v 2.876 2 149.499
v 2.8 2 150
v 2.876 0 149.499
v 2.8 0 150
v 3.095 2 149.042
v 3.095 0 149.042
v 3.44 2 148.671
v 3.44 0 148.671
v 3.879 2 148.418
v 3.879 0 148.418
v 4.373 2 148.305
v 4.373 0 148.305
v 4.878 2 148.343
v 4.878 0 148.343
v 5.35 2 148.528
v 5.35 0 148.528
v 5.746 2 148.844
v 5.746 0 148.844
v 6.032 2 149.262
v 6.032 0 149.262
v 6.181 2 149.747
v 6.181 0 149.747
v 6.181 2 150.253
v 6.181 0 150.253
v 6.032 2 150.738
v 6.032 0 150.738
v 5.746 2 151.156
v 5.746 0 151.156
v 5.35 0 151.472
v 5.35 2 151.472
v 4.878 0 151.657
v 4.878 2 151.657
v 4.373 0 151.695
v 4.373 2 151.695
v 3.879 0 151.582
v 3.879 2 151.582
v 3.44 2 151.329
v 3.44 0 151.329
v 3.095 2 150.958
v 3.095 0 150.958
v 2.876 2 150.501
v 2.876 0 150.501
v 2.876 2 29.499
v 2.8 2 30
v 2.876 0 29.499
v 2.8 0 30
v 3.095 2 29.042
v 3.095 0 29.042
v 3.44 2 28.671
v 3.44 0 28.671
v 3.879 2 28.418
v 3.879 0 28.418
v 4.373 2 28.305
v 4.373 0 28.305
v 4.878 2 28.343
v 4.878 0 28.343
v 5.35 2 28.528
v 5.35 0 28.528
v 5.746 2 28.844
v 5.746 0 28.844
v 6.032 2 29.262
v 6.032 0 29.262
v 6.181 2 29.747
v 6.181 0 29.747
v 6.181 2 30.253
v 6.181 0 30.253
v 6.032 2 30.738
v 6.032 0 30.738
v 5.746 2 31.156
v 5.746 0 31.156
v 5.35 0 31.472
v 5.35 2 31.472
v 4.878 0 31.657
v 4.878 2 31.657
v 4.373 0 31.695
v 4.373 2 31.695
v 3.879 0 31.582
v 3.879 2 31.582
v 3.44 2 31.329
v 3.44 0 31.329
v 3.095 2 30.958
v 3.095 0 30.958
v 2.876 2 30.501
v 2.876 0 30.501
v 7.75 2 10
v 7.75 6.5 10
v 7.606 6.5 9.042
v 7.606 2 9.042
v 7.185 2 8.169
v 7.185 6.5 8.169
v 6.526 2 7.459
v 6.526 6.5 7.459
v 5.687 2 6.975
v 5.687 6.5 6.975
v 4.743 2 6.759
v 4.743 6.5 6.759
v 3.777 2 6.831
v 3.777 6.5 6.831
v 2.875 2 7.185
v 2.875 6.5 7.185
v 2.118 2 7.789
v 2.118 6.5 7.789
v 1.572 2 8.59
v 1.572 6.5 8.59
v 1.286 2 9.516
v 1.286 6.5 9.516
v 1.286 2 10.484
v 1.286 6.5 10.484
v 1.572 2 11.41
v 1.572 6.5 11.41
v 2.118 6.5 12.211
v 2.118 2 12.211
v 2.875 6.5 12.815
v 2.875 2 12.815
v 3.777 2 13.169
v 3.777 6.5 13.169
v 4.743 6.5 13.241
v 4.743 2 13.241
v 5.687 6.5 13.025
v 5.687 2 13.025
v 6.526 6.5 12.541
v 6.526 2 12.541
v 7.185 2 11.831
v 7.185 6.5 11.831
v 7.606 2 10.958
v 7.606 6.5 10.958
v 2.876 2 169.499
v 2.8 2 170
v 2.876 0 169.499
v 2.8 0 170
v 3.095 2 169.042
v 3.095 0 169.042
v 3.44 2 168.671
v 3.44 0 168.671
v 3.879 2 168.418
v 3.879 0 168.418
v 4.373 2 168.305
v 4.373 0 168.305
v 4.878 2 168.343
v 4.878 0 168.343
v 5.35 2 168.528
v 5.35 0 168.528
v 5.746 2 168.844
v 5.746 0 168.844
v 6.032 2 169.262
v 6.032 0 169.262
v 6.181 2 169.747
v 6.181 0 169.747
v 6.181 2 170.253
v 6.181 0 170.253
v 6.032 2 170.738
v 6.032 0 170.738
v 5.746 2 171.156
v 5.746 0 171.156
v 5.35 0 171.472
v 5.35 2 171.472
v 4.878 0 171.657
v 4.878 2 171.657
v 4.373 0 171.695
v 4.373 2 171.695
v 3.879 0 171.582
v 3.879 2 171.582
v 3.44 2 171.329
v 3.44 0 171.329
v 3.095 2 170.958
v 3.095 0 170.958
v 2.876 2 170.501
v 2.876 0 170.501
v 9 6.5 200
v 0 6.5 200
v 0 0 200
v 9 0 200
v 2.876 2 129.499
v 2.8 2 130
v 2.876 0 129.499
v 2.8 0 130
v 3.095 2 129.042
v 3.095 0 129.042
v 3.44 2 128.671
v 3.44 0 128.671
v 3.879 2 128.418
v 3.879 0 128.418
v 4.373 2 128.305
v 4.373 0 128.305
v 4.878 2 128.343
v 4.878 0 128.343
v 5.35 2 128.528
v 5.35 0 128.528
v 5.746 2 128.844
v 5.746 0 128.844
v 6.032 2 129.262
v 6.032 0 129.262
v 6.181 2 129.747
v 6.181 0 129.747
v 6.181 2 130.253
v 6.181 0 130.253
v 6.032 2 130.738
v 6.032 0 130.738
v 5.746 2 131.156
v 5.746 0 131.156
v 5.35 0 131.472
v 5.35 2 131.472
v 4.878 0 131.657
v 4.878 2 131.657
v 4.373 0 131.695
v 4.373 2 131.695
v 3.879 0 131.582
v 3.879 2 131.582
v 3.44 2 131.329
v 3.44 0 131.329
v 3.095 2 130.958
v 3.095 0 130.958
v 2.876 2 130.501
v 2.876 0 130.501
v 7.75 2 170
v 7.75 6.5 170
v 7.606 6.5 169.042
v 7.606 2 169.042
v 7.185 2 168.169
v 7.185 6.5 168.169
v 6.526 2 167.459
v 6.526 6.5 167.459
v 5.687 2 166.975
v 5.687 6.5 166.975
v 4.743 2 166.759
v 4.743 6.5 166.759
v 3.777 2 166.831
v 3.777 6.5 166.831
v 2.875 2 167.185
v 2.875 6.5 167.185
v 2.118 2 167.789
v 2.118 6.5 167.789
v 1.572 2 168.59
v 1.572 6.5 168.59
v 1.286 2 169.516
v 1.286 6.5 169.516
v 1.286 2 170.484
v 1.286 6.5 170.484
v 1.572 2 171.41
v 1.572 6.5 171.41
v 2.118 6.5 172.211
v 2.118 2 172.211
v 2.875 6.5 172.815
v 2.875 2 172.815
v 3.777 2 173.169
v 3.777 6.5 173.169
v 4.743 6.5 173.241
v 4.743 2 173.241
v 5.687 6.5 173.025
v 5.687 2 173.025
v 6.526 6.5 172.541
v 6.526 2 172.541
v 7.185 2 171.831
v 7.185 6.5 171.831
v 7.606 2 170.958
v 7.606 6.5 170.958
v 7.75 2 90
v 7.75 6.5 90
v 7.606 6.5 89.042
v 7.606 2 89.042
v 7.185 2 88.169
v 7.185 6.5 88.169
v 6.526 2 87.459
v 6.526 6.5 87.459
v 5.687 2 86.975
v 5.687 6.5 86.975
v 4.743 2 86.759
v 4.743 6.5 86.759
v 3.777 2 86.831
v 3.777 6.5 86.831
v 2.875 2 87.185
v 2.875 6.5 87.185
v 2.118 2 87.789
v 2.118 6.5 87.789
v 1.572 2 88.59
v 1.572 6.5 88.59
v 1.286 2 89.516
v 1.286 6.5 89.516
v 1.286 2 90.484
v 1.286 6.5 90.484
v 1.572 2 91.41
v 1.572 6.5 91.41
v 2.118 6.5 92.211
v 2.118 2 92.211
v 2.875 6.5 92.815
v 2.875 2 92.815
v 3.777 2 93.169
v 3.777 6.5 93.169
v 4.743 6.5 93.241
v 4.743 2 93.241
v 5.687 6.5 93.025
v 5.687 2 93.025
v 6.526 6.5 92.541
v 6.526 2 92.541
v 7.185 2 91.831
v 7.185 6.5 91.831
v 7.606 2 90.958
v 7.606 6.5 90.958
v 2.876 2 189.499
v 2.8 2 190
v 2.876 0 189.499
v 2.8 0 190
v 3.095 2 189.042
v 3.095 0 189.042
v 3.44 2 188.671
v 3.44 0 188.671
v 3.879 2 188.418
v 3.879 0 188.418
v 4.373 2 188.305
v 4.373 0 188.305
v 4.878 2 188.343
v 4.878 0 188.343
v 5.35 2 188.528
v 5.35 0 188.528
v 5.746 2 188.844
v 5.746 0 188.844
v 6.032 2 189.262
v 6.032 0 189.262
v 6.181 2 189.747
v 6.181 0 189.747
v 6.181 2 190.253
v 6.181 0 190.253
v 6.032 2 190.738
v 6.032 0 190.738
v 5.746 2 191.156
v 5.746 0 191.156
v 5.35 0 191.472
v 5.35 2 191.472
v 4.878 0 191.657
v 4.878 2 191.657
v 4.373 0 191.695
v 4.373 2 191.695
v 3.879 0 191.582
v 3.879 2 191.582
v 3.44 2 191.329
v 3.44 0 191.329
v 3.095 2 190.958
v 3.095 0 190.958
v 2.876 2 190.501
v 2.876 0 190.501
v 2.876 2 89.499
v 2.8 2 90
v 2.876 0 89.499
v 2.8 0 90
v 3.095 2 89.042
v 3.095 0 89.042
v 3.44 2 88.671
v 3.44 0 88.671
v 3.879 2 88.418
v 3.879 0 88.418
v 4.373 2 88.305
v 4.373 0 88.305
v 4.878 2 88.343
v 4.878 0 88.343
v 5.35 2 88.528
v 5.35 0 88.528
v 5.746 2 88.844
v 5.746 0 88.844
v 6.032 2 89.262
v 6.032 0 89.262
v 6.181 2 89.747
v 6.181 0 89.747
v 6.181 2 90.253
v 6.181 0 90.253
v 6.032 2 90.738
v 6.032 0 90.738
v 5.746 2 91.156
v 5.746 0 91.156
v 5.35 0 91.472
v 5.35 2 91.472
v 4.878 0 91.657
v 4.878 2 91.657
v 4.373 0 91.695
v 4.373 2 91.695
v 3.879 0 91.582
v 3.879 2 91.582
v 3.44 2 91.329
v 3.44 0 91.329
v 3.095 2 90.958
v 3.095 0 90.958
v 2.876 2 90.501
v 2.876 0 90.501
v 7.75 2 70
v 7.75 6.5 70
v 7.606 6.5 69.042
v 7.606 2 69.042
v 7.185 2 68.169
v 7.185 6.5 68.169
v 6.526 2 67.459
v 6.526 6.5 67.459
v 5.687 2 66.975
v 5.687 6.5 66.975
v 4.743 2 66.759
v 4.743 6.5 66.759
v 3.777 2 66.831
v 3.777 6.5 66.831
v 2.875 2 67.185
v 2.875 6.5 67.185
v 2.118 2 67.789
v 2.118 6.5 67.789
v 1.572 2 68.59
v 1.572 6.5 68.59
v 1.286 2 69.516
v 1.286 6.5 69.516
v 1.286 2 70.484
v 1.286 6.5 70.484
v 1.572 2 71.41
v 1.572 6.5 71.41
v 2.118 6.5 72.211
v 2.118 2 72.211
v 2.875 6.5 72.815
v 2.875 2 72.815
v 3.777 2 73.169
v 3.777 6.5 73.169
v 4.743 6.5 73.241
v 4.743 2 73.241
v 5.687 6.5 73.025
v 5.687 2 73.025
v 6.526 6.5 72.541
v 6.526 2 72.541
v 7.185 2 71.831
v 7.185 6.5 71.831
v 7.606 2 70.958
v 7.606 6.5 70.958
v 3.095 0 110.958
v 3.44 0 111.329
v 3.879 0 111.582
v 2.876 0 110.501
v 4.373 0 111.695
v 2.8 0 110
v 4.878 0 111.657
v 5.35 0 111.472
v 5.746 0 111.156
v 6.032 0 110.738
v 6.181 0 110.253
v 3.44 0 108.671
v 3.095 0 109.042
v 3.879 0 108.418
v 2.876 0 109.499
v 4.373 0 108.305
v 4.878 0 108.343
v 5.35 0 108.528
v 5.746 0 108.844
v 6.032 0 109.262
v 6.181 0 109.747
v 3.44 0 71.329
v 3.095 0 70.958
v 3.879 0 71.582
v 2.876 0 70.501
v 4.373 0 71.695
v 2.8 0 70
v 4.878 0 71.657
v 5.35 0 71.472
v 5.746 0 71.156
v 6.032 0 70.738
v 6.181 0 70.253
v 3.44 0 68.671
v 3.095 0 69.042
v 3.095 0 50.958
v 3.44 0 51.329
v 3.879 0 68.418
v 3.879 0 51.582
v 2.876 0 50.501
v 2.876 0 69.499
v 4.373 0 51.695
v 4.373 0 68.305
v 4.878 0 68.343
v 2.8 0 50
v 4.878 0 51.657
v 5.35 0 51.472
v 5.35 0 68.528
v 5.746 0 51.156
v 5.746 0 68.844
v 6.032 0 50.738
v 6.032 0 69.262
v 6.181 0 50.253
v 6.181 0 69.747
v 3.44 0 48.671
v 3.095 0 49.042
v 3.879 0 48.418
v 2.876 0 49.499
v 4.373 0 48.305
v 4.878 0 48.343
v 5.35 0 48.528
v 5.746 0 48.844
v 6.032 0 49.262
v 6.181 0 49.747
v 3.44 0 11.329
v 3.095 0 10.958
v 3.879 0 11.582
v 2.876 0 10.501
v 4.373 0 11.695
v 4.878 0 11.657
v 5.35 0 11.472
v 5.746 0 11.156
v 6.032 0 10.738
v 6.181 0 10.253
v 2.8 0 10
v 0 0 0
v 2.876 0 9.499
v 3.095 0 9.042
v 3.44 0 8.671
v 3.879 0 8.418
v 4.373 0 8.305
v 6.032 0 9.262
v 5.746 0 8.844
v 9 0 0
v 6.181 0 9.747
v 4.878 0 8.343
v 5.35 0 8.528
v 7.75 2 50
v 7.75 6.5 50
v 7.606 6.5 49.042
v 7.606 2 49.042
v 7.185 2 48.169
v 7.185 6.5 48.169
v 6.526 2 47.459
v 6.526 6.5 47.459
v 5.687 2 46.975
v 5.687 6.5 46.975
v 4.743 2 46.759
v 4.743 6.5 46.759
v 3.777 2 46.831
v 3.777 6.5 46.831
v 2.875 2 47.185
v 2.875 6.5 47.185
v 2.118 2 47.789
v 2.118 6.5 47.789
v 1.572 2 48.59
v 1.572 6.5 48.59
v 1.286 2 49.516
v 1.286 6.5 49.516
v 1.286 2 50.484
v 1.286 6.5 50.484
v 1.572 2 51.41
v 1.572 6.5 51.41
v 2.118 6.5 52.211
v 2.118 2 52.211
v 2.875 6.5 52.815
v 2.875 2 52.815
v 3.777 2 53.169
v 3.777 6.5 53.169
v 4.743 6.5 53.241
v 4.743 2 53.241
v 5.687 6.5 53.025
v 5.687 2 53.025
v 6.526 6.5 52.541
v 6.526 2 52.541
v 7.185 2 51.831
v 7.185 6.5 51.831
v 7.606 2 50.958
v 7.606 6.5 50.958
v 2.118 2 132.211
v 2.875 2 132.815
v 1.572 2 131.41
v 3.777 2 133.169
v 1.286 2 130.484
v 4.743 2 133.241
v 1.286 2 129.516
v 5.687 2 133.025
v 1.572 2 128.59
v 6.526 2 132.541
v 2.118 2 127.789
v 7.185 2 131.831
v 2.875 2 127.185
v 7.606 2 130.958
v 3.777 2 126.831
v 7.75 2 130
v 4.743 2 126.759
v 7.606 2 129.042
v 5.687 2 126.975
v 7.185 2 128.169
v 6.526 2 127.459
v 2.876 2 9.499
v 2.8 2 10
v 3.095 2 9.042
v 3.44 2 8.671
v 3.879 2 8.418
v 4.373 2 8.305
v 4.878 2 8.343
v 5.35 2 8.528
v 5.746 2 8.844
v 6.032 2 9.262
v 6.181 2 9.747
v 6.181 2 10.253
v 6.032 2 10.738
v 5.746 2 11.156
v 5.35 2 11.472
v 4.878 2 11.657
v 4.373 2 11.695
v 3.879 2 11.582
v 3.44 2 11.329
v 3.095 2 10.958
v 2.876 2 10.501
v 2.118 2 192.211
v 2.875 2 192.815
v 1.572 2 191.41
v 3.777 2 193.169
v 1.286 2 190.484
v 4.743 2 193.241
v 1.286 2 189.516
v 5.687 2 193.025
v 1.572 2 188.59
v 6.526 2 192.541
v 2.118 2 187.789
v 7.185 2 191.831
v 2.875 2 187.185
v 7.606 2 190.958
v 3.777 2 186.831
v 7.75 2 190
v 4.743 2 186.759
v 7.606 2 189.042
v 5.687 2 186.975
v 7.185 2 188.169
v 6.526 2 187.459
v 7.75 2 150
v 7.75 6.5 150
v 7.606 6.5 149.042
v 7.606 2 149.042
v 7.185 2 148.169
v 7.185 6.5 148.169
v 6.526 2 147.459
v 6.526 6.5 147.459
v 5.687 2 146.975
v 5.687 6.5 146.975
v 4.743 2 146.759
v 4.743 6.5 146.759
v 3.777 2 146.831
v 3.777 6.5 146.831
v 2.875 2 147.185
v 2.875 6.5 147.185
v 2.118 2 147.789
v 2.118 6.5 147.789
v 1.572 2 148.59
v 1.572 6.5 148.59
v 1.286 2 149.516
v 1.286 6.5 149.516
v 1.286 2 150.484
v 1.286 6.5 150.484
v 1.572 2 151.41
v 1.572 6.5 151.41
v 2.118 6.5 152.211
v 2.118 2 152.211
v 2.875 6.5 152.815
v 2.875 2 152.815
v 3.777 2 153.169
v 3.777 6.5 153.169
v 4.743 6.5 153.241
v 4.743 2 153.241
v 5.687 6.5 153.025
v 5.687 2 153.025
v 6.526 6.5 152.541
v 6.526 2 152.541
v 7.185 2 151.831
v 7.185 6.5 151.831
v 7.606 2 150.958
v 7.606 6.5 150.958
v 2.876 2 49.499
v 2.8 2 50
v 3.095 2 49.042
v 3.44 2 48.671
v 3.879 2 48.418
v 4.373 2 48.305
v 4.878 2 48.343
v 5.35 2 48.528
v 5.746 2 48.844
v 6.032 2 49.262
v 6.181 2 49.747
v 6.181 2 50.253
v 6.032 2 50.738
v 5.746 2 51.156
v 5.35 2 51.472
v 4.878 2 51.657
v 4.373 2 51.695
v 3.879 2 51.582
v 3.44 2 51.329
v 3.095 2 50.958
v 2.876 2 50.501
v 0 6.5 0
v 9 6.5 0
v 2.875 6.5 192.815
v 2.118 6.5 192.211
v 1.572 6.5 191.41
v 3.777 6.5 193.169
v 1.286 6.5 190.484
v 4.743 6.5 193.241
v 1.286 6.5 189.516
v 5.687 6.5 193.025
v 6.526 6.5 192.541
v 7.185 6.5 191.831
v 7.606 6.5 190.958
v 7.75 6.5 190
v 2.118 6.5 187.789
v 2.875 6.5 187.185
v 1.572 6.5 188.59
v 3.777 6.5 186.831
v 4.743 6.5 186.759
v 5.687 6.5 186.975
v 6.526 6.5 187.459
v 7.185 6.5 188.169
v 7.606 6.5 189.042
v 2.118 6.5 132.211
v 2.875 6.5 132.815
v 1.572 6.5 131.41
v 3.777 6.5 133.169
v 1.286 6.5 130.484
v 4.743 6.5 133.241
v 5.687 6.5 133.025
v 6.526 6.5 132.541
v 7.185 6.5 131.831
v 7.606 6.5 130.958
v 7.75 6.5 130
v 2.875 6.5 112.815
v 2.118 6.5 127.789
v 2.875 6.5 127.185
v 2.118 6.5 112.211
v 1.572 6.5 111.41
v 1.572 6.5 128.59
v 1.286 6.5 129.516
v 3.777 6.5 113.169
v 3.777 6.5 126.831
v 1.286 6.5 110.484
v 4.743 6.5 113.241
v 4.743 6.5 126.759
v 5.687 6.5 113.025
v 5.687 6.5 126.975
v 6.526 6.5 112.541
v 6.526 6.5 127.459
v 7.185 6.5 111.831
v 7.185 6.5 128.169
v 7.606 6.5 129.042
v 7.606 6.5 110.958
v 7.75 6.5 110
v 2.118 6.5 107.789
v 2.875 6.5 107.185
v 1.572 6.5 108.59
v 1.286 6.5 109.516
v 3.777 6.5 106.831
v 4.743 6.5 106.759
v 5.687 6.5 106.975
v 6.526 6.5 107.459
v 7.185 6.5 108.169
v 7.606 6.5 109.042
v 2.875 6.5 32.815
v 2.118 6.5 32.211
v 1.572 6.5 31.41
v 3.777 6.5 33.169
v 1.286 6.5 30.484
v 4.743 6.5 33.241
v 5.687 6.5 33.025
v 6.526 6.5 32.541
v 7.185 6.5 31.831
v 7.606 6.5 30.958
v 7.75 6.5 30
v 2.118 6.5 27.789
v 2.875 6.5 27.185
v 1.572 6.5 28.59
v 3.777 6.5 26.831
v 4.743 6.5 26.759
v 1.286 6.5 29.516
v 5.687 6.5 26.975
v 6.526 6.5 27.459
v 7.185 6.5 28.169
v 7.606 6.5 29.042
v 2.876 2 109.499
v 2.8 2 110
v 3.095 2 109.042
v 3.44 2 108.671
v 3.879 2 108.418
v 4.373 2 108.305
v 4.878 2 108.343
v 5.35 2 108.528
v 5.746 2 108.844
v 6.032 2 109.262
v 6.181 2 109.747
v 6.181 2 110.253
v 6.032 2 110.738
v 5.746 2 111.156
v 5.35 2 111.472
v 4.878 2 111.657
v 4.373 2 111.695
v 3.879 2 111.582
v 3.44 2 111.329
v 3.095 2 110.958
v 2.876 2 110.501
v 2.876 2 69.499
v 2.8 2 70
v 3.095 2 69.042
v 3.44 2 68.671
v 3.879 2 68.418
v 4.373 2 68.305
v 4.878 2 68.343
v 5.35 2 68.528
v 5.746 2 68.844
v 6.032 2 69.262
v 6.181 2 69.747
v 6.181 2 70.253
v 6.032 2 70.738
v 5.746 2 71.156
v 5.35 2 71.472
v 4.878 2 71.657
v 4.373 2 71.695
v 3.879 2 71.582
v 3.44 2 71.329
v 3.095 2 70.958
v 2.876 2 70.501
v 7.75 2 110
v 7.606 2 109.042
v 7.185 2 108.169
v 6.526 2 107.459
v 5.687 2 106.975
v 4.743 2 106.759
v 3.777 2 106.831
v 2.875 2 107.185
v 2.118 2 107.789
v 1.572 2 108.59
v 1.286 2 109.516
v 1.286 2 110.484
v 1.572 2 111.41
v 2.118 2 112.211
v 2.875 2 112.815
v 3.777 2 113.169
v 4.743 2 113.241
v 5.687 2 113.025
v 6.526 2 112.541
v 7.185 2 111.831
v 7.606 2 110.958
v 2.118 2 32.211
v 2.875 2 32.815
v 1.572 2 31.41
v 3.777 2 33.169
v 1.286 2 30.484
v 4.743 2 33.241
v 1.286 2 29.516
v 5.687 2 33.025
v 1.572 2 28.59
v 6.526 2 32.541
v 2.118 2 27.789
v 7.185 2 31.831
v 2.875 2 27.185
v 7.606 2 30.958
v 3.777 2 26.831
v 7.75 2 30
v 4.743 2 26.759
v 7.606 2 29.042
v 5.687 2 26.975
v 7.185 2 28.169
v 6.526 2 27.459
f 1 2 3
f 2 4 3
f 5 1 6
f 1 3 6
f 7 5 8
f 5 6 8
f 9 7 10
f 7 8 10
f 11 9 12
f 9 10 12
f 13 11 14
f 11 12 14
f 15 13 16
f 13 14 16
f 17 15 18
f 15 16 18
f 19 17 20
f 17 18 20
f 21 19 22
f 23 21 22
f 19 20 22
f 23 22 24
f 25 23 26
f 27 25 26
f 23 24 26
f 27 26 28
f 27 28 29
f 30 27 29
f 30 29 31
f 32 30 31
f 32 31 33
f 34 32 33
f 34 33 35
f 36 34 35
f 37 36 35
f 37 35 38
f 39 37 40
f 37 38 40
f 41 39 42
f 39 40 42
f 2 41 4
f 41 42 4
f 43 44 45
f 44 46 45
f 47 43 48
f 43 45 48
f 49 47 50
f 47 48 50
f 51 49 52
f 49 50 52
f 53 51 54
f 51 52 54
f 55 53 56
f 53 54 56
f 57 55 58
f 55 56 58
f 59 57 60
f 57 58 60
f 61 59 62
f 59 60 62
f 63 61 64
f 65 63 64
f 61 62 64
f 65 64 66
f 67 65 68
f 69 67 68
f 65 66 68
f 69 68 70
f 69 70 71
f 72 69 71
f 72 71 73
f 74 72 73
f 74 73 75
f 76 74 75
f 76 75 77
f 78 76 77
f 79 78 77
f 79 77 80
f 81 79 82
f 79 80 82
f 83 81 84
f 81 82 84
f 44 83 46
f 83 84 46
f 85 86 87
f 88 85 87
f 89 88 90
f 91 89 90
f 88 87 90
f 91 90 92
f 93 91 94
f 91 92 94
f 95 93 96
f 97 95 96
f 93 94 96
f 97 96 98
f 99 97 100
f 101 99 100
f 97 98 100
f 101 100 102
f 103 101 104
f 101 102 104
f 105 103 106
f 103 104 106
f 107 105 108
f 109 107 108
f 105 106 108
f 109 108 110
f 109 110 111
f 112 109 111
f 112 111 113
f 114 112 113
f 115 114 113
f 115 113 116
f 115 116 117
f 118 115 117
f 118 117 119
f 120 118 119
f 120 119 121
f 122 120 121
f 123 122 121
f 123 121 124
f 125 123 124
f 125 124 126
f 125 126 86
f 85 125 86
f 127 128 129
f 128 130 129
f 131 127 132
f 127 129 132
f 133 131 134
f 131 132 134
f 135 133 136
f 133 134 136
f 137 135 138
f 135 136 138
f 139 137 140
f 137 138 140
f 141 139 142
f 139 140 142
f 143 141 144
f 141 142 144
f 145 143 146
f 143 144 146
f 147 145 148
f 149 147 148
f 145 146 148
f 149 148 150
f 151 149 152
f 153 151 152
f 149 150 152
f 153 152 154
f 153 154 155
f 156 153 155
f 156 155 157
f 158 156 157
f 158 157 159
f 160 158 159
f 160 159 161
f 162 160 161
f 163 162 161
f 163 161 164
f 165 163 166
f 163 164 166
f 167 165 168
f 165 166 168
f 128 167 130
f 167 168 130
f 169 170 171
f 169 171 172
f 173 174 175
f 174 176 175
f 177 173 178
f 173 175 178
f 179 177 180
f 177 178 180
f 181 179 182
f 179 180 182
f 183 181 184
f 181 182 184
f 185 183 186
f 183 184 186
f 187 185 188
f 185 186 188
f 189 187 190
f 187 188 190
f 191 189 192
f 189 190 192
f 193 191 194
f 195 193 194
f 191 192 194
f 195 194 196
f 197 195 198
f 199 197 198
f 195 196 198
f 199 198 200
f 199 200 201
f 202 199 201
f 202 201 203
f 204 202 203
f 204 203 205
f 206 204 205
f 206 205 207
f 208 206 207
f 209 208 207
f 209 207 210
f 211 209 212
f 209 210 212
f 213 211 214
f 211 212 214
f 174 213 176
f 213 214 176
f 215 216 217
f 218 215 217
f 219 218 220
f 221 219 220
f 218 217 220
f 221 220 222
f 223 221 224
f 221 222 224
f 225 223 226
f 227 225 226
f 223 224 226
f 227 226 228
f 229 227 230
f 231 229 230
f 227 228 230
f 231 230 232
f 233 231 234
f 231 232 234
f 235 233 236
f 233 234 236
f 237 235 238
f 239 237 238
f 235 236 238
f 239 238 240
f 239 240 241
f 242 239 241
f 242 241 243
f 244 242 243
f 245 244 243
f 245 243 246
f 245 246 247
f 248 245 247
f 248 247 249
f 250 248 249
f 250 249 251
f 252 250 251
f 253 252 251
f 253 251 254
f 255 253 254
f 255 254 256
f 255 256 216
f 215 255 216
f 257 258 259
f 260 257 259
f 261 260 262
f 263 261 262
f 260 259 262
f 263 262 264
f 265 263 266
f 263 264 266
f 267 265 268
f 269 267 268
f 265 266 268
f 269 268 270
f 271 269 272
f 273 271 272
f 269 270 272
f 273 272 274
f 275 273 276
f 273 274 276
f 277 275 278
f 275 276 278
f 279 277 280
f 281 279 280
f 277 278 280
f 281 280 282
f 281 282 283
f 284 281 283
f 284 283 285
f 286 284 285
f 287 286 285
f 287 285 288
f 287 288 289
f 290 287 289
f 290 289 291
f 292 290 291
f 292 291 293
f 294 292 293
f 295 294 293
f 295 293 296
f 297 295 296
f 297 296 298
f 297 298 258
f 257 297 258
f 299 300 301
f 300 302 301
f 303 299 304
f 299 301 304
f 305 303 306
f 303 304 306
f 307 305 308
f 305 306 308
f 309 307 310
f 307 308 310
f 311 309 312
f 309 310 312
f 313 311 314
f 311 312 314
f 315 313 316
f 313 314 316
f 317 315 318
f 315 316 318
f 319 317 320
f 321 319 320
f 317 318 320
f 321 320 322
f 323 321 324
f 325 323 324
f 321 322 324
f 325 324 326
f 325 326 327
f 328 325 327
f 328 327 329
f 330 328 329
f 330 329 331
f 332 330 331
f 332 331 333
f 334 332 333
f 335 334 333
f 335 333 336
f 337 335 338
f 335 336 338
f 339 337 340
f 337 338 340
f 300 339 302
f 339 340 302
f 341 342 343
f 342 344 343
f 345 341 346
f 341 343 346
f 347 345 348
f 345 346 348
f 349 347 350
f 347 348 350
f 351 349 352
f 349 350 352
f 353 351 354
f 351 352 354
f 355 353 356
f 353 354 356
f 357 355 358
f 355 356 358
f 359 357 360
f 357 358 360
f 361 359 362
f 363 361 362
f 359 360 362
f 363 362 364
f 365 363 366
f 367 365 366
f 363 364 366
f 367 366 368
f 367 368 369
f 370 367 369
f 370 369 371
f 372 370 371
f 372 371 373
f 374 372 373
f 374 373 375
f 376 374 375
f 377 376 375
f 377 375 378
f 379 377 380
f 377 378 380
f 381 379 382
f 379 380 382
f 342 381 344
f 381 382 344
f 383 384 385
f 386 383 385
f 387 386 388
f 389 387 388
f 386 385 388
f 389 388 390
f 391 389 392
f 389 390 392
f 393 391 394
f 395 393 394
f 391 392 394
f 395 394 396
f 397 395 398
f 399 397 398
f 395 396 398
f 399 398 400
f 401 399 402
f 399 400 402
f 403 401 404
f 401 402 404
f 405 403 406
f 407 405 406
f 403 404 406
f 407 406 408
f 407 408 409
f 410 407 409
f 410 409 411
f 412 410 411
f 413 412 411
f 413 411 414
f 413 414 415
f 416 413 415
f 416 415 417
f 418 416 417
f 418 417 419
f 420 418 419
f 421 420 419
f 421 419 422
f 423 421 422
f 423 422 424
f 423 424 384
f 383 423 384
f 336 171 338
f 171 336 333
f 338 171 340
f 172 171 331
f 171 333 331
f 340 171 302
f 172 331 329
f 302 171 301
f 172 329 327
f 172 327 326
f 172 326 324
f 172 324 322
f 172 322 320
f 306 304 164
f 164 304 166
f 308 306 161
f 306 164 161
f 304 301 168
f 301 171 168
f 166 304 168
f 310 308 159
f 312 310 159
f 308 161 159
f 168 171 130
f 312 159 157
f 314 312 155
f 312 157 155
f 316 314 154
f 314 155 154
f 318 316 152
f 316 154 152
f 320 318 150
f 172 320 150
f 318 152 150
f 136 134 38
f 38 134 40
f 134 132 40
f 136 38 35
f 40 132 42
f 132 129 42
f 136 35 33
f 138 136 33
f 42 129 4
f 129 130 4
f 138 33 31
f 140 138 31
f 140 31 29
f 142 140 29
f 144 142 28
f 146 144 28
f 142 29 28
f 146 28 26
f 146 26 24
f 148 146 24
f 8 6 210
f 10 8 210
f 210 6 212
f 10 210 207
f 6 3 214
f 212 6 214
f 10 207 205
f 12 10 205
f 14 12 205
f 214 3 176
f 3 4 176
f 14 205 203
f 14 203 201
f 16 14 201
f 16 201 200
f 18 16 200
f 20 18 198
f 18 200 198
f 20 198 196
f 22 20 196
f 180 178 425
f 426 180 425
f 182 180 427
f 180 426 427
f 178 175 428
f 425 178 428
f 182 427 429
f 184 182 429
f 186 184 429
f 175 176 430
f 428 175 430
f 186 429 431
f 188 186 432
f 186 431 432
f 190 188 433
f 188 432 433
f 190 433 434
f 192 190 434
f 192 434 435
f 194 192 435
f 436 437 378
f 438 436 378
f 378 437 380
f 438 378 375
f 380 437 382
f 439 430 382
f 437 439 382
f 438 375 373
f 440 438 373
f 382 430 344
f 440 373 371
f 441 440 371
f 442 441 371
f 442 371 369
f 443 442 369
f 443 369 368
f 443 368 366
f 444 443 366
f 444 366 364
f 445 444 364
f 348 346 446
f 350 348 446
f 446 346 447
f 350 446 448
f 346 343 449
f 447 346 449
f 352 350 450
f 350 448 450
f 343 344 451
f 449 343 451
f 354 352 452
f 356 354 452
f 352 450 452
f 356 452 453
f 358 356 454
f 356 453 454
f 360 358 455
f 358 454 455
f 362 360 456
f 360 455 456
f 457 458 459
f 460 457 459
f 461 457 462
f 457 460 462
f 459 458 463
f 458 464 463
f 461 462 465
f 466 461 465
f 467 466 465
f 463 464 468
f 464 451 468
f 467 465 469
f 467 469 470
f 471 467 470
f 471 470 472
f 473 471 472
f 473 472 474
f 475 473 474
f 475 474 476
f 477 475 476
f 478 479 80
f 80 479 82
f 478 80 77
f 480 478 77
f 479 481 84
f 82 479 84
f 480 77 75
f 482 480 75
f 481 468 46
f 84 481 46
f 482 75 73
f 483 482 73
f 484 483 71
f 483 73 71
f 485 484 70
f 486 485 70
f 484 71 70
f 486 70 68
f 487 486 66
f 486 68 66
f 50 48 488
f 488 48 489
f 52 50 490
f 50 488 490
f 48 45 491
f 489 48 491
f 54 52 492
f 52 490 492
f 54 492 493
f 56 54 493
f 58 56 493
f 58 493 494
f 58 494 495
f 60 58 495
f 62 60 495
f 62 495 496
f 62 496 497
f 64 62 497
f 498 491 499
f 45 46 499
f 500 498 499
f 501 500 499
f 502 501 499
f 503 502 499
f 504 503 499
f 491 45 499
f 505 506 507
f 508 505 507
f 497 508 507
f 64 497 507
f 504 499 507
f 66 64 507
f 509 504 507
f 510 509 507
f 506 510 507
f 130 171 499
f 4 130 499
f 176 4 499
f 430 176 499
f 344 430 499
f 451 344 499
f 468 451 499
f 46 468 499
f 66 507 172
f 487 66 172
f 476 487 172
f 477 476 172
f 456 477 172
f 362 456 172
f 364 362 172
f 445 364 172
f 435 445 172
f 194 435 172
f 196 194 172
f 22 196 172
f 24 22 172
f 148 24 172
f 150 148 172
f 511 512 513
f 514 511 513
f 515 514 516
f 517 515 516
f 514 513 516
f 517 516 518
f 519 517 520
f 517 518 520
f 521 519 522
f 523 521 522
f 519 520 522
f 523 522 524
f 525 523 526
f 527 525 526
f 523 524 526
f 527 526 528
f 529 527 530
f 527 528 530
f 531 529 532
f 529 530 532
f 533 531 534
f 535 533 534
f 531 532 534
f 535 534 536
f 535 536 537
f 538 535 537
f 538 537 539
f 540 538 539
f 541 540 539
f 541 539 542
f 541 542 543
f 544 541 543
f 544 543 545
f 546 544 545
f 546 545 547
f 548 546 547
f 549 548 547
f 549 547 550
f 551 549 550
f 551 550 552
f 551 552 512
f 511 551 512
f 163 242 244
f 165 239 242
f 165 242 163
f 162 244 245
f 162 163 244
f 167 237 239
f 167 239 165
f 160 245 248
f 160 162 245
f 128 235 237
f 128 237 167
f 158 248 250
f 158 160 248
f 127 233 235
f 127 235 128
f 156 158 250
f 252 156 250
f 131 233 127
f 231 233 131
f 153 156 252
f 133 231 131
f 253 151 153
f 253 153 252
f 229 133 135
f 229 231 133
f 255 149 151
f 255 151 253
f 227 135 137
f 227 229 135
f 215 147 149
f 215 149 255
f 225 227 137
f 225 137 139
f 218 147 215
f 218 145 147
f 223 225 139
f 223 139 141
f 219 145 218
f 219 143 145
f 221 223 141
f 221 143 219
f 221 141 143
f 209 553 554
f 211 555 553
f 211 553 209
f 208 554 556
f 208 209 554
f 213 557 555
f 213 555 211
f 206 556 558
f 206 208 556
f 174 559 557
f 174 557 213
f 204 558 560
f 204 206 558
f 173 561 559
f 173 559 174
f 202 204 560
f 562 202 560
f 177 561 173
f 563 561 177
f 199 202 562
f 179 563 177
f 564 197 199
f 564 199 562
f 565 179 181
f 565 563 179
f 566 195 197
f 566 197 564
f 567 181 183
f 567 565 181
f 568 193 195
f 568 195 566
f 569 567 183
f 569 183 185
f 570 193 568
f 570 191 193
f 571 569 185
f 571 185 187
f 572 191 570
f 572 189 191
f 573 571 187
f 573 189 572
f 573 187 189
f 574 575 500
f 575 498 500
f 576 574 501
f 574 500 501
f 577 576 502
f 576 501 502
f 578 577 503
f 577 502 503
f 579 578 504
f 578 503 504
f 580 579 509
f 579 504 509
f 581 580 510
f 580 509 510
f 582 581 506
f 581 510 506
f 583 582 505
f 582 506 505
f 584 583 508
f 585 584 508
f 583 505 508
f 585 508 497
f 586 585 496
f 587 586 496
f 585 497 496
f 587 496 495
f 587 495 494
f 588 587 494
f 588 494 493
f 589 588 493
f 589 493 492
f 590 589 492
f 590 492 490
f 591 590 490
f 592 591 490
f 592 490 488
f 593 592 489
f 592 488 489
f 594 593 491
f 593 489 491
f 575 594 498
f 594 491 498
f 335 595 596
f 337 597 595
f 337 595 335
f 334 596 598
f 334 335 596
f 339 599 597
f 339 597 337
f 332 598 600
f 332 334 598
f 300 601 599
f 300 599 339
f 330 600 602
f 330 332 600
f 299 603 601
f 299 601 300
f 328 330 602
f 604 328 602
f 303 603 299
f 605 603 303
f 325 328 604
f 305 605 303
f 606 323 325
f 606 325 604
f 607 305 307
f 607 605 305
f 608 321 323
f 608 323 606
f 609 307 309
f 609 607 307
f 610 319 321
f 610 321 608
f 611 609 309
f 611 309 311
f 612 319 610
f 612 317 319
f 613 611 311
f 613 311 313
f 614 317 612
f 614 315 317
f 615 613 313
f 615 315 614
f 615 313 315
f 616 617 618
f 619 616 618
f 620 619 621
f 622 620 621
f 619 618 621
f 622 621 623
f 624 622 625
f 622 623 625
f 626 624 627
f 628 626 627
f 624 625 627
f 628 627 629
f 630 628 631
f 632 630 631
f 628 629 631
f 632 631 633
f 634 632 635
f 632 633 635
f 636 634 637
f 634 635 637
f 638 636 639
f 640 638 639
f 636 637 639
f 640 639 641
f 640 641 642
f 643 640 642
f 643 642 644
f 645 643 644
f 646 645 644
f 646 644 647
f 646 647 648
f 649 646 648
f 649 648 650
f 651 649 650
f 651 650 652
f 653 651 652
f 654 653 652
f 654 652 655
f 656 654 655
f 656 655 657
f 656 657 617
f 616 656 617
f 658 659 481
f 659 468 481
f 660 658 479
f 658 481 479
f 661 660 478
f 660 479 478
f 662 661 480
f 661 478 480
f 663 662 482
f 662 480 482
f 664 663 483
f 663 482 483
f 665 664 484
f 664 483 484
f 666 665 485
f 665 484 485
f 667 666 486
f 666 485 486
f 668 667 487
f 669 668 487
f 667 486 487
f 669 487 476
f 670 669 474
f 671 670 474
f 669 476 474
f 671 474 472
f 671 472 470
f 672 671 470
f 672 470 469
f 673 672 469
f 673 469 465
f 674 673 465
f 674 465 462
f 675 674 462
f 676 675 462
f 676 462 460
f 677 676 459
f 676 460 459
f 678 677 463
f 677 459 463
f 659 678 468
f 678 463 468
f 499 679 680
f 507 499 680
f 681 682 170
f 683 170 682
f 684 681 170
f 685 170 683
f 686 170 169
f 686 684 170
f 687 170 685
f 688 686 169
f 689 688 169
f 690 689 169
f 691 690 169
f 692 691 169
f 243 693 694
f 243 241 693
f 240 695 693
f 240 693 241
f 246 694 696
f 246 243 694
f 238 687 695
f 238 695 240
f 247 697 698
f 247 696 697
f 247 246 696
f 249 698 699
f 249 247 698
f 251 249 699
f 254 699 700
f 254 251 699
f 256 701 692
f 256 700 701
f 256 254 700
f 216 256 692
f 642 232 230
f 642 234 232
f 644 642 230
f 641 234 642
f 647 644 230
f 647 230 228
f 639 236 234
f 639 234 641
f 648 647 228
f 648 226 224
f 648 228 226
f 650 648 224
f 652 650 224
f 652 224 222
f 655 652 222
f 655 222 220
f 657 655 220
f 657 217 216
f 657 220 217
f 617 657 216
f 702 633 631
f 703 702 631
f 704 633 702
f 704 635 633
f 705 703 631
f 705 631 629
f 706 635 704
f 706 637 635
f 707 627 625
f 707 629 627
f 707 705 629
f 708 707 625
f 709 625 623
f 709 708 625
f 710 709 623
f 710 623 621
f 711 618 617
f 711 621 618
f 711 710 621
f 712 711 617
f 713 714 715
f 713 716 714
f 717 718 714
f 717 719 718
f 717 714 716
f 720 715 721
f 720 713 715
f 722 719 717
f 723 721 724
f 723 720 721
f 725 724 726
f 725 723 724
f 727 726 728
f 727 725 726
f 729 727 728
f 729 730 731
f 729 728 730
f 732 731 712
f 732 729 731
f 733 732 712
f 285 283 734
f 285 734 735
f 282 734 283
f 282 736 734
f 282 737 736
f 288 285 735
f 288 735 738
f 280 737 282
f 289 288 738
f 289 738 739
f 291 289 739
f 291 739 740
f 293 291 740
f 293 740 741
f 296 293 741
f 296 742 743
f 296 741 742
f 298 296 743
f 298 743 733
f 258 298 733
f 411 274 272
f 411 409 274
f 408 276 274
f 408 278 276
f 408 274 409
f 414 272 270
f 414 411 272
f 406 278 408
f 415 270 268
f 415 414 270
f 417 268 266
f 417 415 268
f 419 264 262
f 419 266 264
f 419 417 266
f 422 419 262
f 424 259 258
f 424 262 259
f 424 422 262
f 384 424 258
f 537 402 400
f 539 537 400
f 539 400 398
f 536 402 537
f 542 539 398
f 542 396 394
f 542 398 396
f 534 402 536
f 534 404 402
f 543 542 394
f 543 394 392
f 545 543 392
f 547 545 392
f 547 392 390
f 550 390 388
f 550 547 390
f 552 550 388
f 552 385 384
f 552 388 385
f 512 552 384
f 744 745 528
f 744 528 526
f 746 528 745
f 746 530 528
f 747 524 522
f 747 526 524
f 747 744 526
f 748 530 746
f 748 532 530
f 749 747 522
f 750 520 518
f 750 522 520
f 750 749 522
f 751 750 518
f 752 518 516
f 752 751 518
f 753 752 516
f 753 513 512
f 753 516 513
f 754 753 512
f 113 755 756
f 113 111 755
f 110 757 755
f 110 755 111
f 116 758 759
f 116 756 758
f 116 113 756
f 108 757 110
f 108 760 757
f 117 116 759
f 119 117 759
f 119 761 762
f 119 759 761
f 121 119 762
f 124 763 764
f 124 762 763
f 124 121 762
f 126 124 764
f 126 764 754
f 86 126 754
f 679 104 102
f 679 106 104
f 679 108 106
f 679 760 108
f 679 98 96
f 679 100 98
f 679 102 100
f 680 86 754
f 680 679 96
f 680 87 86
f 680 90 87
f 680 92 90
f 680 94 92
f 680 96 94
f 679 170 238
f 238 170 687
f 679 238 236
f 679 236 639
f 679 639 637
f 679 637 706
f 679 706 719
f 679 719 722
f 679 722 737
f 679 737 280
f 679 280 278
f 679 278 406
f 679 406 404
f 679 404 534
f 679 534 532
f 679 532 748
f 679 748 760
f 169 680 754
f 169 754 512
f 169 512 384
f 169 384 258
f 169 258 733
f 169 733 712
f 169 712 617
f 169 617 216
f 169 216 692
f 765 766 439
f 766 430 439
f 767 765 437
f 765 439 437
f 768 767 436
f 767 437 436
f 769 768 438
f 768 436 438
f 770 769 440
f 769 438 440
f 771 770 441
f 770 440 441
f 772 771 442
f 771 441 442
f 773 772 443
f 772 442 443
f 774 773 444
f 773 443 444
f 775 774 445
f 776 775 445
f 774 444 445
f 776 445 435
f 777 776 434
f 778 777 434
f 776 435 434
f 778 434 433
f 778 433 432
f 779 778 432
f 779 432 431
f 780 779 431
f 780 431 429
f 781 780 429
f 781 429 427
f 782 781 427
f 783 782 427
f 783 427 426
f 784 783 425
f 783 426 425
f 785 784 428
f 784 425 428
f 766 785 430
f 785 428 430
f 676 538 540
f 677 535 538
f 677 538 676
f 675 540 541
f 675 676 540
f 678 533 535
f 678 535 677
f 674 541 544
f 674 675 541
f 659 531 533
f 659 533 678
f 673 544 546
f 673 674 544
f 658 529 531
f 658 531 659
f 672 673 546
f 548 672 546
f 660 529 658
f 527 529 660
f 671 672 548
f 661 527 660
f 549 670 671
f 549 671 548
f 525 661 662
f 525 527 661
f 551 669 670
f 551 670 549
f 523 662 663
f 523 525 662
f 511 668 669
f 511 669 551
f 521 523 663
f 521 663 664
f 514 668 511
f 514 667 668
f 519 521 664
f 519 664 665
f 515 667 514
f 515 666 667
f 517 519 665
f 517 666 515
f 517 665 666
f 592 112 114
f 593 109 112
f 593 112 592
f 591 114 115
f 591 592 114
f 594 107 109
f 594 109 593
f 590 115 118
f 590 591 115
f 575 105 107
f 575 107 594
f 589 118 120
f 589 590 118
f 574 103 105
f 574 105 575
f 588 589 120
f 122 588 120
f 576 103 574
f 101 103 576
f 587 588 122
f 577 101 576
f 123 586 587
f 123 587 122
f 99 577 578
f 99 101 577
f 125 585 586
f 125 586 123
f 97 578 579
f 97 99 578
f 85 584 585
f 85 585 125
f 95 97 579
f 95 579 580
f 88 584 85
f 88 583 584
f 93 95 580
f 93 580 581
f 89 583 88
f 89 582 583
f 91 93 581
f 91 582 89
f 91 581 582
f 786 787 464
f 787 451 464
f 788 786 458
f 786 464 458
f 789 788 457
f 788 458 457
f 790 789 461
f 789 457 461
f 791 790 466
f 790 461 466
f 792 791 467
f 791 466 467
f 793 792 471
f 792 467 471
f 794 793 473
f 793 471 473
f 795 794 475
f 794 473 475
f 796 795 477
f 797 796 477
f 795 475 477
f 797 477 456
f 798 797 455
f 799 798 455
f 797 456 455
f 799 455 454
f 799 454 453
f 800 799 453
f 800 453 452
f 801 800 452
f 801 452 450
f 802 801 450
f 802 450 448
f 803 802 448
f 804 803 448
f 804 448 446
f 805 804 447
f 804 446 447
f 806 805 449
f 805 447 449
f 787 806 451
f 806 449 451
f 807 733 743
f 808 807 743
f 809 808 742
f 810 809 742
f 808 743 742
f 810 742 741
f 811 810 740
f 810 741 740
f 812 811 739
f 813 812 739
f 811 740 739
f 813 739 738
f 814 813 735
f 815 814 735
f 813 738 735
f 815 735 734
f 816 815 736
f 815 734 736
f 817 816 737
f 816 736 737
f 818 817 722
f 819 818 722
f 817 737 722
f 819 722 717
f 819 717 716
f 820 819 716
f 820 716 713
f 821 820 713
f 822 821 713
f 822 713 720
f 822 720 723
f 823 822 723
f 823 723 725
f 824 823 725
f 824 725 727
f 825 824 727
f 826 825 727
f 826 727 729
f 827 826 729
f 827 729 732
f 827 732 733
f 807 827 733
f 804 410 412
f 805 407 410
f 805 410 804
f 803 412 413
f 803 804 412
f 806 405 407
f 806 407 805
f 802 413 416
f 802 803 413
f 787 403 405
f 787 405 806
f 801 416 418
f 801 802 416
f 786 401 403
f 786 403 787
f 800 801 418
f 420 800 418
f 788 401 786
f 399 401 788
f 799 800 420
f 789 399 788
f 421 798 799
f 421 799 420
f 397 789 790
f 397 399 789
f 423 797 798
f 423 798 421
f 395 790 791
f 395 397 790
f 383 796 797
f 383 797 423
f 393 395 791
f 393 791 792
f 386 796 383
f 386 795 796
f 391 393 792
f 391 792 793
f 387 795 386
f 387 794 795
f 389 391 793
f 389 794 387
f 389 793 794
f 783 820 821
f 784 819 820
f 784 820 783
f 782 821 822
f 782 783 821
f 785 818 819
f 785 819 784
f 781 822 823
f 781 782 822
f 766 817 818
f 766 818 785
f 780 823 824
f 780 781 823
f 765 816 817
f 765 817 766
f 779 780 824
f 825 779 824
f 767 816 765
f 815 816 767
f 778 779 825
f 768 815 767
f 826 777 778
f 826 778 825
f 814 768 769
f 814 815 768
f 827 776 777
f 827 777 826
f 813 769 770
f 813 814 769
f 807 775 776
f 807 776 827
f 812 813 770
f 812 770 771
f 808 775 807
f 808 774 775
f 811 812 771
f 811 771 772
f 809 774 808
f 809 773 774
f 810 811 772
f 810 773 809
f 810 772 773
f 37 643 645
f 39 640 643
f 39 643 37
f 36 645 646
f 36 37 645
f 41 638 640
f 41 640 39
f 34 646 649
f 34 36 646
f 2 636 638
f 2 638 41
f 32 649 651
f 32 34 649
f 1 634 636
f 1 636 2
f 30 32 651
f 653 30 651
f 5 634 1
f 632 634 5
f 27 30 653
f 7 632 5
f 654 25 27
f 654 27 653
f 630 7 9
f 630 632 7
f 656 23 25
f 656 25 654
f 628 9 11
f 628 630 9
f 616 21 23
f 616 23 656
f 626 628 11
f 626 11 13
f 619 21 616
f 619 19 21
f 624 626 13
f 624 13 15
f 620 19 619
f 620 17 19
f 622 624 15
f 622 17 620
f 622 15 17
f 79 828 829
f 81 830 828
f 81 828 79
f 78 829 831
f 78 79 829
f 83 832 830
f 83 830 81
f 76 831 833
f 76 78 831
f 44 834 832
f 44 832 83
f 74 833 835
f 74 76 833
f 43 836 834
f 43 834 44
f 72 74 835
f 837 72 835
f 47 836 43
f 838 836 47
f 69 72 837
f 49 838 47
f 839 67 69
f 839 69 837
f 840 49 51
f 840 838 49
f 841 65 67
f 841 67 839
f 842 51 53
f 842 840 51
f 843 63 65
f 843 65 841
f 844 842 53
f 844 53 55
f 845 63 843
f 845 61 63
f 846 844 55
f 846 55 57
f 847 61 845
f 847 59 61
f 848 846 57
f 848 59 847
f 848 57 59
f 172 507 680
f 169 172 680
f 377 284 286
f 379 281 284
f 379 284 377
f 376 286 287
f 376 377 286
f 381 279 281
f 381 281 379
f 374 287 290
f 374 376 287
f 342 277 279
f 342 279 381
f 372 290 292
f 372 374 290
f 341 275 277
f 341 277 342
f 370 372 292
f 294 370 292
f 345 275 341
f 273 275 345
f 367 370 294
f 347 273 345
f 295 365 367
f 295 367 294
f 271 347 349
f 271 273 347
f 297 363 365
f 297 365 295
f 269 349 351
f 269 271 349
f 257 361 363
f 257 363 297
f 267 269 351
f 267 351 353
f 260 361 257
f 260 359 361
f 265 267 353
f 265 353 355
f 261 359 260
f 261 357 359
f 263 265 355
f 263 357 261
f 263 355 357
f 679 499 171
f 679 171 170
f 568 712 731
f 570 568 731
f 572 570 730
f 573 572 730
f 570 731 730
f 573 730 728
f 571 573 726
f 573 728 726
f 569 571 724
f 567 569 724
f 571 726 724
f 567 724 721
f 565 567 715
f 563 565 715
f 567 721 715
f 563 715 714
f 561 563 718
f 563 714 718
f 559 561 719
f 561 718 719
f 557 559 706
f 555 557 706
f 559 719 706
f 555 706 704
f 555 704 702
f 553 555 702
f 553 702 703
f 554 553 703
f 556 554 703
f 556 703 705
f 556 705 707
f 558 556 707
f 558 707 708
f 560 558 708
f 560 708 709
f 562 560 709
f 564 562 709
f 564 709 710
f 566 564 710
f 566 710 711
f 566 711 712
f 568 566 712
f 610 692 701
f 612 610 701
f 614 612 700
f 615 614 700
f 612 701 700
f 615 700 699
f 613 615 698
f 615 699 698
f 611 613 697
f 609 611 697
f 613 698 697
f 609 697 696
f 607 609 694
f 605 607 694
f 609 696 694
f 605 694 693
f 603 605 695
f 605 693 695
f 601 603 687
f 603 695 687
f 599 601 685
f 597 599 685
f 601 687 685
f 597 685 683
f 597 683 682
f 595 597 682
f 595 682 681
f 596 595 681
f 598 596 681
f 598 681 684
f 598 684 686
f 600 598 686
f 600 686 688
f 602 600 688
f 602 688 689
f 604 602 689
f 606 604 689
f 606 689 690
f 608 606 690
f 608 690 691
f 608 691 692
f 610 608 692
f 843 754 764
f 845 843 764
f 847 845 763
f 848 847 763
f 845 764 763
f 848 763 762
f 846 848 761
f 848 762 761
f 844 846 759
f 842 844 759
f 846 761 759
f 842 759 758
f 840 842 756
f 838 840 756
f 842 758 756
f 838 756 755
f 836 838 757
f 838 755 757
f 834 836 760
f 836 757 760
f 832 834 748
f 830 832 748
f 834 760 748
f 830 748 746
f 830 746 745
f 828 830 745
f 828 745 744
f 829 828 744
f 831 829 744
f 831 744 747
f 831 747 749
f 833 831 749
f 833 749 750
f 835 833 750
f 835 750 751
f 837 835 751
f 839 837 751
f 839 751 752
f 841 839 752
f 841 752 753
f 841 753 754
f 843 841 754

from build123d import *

# Parameters (mm, degrees)
SKETCH1_W                      = 9
SKETCH1_H                      = 6.5
BOSS_EXTRUDE1_DEPTH            = 200
CBORE_FOR_M3_SHCS1_D           = 3.4
CBORE_FOR_M3_SHCS1_CBORE_D     = 6.5
CBORE_FOR_M3_SHCS1_CBORE_DEPTH = 4.5


with BuildPart() as part:
    # Sketch1 → Boss-Extrude1 (new body)
    with BuildSketch(Plane.XY):
        with Locations((4.5, 3.25)):
            Rectangle(SKETCH1_W, SKETCH1_H)
    extrude(amount=BOSS_EXTRUDE1_DEPTH)

    # CBORE for M3 SHCS1 (through all)
    with Locations(Plane(origin=(0, 6.5, 0), x_dir=(1, 0, 0), z_dir=(0, 1, 0))):
        with Locations((4.5, -190), (4.5, -170), (4.5, -150), (4.5, -130), (4.5, -110), (4.5, -90), (4.5, -70), (4.5, -50), (4.5, -30), (4.5, -10)):
            CounterBoreHole(CBORE_FOR_M3_SHCS1_D / 2, CBORE_FOR_M3_SHCS1_CBORE_D / 2, CBORE_FOR_M3_SHCS1_CBORE_DEPTH)


solid = part.part
